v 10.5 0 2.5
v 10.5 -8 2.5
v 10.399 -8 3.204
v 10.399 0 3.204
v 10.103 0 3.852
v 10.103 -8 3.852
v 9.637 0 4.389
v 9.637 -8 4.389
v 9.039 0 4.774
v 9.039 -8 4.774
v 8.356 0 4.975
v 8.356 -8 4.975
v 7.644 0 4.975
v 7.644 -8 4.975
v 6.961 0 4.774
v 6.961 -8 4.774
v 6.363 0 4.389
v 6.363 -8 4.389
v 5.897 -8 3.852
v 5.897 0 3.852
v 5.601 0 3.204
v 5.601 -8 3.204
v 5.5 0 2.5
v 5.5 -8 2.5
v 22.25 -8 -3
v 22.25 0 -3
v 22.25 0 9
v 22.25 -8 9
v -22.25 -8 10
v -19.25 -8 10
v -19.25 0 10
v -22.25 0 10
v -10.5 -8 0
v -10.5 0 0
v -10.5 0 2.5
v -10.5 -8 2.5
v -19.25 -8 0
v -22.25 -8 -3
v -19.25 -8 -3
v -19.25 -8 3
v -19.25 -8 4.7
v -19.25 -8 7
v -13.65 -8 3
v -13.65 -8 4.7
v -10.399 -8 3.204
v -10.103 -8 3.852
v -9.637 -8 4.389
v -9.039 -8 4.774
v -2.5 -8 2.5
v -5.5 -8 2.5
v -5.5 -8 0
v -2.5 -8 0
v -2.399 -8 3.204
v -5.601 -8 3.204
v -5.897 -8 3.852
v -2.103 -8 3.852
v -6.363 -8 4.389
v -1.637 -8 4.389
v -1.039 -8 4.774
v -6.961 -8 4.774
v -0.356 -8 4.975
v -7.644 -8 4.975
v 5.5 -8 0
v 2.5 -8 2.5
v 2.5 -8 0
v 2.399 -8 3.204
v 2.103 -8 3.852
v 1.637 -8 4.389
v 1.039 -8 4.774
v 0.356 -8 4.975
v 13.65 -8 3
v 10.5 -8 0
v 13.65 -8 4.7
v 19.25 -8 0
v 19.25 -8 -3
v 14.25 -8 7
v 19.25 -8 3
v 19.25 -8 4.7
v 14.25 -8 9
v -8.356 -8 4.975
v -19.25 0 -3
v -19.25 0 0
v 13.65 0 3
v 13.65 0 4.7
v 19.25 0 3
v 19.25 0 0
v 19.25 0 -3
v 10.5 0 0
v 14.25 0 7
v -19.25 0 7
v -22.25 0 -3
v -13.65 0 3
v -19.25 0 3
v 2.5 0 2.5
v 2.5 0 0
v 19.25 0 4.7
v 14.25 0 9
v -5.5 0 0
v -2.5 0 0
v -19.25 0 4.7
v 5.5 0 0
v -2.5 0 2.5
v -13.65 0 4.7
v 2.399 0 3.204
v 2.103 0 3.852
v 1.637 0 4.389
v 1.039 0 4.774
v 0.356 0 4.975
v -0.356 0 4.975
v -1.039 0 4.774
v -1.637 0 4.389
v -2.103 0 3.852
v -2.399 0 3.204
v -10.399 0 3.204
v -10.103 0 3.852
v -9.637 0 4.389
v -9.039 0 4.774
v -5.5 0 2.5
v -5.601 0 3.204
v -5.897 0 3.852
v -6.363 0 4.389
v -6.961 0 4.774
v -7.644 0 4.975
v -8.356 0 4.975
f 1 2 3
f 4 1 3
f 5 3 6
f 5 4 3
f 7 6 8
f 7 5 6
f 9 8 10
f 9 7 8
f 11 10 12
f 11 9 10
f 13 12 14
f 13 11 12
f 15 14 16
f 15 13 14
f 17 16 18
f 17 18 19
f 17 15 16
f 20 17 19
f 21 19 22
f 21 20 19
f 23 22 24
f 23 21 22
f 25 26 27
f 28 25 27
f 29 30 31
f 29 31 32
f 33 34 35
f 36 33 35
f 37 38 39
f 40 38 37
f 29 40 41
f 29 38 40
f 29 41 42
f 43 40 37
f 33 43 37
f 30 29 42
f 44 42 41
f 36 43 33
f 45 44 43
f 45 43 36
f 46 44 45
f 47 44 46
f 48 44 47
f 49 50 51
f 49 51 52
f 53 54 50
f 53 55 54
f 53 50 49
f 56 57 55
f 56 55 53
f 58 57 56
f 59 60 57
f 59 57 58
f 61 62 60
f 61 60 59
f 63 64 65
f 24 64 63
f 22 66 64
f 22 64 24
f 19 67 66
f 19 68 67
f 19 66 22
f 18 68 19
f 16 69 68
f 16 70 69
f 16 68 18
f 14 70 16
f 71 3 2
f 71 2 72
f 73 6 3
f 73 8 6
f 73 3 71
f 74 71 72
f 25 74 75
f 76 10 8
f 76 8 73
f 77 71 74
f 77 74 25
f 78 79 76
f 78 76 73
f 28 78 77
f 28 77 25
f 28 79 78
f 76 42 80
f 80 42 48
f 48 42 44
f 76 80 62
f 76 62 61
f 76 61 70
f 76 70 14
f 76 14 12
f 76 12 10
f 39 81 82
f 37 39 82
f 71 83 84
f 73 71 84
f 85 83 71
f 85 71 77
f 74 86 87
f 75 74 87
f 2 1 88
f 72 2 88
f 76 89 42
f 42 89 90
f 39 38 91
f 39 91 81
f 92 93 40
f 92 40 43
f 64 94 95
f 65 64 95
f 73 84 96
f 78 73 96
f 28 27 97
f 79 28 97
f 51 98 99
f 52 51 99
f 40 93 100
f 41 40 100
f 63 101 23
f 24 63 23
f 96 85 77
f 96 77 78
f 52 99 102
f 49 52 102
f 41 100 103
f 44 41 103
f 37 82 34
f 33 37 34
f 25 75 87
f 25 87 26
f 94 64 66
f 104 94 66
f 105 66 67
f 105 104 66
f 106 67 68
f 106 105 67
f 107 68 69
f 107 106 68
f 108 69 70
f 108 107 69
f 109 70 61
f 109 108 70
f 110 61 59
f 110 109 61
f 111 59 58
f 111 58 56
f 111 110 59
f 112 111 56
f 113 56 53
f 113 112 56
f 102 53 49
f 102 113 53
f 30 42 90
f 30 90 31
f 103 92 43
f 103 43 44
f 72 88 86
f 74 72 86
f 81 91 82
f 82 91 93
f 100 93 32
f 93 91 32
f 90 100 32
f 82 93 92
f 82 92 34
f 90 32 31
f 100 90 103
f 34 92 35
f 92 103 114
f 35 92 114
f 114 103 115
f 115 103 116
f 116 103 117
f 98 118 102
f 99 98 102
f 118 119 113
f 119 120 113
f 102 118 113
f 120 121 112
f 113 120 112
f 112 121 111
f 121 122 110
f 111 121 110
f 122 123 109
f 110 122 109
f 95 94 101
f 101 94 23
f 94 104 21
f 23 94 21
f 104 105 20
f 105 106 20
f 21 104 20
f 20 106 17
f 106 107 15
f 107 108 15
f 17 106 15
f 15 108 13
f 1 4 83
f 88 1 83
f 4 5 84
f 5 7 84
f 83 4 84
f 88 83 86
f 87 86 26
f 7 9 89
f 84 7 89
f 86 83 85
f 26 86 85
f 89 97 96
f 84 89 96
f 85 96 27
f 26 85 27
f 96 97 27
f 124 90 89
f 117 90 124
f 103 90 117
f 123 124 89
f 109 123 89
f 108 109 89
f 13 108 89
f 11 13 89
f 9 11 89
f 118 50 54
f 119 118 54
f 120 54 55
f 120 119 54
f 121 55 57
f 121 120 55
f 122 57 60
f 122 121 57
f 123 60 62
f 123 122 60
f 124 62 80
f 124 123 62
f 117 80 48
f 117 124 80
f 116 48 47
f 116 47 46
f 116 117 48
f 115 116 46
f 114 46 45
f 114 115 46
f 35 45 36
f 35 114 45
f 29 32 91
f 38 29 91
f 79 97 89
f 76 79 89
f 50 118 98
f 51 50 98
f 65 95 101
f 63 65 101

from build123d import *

# Parameters (mm, degrees)
SKETCH_W  = 5.6
SKETCH_H  = 1.7
PAD_DEPTH = 8


with BuildPart() as part:
    # Sketch → Pad (new body)
    with BuildSketch(Plane.XZ):
        with BuildLine():
            Line((-22.25, -3), (-19.25, -3))
            Line((-19.25, -3), (-19.25, 0))
            Line((-19.25, 0), (-10.5, 0))
            Line((-10.5, 0), (-10.5, 2.5))
            ThreePointArc((-5.5, 2.5), (-8, 5), (-10.5, 2.5))
            Line((-5.5, 2.5), (-5.5, 0))
            Line((-5.5, 0), (-2.5, 0))
            Line((-2.5, 0), (-2.5, 2.5))
            ThreePointArc((2.5, 2.5), (0, 5), (-2.5, 2.5))
            Line((2.5, 2.5), (2.5, 0))
            Line((2.5, 0), (5.5, 0))
            Line((5.5, 0), (5.5, 2.5))
            ThreePointArc((10.5, 2.5), (8, 5), (5.5, 2.5))
            Line((10.5, 2.5), (10.5, 0))
            Line((10.5, 0), (19.25, 0))
            Line((19.25, 0), (19.25, -3))
            Line((19.25, -3), (22.25, -3))
            Line((22.25, -3), (22.25, 9))
            Line((22.25, 9), (14.25, 9))
            Line((14.25, 9), (14.25, 7))
            Line((14.25, 7), (-19.25, 7))
            Line((-19.25, 7), (-19.25, 10))
            Line((-19.25, 10), (-22.25, 10))
            Line((-22.25, 10), (-22.25, -3))
        make_face()
        with Locations((-16.45, 3.85)):
            Rectangle(SKETCH_W, SKETCH_H, mode=Mode.SUBTRACT)
        with Locations((16.45, 3.85)):
            Rectangle(SKETCH_W, SKETCH_H, mode=Mode.SUBTRACT)
    extrude(amount=PAD_DEPTH)


solid = part.part
